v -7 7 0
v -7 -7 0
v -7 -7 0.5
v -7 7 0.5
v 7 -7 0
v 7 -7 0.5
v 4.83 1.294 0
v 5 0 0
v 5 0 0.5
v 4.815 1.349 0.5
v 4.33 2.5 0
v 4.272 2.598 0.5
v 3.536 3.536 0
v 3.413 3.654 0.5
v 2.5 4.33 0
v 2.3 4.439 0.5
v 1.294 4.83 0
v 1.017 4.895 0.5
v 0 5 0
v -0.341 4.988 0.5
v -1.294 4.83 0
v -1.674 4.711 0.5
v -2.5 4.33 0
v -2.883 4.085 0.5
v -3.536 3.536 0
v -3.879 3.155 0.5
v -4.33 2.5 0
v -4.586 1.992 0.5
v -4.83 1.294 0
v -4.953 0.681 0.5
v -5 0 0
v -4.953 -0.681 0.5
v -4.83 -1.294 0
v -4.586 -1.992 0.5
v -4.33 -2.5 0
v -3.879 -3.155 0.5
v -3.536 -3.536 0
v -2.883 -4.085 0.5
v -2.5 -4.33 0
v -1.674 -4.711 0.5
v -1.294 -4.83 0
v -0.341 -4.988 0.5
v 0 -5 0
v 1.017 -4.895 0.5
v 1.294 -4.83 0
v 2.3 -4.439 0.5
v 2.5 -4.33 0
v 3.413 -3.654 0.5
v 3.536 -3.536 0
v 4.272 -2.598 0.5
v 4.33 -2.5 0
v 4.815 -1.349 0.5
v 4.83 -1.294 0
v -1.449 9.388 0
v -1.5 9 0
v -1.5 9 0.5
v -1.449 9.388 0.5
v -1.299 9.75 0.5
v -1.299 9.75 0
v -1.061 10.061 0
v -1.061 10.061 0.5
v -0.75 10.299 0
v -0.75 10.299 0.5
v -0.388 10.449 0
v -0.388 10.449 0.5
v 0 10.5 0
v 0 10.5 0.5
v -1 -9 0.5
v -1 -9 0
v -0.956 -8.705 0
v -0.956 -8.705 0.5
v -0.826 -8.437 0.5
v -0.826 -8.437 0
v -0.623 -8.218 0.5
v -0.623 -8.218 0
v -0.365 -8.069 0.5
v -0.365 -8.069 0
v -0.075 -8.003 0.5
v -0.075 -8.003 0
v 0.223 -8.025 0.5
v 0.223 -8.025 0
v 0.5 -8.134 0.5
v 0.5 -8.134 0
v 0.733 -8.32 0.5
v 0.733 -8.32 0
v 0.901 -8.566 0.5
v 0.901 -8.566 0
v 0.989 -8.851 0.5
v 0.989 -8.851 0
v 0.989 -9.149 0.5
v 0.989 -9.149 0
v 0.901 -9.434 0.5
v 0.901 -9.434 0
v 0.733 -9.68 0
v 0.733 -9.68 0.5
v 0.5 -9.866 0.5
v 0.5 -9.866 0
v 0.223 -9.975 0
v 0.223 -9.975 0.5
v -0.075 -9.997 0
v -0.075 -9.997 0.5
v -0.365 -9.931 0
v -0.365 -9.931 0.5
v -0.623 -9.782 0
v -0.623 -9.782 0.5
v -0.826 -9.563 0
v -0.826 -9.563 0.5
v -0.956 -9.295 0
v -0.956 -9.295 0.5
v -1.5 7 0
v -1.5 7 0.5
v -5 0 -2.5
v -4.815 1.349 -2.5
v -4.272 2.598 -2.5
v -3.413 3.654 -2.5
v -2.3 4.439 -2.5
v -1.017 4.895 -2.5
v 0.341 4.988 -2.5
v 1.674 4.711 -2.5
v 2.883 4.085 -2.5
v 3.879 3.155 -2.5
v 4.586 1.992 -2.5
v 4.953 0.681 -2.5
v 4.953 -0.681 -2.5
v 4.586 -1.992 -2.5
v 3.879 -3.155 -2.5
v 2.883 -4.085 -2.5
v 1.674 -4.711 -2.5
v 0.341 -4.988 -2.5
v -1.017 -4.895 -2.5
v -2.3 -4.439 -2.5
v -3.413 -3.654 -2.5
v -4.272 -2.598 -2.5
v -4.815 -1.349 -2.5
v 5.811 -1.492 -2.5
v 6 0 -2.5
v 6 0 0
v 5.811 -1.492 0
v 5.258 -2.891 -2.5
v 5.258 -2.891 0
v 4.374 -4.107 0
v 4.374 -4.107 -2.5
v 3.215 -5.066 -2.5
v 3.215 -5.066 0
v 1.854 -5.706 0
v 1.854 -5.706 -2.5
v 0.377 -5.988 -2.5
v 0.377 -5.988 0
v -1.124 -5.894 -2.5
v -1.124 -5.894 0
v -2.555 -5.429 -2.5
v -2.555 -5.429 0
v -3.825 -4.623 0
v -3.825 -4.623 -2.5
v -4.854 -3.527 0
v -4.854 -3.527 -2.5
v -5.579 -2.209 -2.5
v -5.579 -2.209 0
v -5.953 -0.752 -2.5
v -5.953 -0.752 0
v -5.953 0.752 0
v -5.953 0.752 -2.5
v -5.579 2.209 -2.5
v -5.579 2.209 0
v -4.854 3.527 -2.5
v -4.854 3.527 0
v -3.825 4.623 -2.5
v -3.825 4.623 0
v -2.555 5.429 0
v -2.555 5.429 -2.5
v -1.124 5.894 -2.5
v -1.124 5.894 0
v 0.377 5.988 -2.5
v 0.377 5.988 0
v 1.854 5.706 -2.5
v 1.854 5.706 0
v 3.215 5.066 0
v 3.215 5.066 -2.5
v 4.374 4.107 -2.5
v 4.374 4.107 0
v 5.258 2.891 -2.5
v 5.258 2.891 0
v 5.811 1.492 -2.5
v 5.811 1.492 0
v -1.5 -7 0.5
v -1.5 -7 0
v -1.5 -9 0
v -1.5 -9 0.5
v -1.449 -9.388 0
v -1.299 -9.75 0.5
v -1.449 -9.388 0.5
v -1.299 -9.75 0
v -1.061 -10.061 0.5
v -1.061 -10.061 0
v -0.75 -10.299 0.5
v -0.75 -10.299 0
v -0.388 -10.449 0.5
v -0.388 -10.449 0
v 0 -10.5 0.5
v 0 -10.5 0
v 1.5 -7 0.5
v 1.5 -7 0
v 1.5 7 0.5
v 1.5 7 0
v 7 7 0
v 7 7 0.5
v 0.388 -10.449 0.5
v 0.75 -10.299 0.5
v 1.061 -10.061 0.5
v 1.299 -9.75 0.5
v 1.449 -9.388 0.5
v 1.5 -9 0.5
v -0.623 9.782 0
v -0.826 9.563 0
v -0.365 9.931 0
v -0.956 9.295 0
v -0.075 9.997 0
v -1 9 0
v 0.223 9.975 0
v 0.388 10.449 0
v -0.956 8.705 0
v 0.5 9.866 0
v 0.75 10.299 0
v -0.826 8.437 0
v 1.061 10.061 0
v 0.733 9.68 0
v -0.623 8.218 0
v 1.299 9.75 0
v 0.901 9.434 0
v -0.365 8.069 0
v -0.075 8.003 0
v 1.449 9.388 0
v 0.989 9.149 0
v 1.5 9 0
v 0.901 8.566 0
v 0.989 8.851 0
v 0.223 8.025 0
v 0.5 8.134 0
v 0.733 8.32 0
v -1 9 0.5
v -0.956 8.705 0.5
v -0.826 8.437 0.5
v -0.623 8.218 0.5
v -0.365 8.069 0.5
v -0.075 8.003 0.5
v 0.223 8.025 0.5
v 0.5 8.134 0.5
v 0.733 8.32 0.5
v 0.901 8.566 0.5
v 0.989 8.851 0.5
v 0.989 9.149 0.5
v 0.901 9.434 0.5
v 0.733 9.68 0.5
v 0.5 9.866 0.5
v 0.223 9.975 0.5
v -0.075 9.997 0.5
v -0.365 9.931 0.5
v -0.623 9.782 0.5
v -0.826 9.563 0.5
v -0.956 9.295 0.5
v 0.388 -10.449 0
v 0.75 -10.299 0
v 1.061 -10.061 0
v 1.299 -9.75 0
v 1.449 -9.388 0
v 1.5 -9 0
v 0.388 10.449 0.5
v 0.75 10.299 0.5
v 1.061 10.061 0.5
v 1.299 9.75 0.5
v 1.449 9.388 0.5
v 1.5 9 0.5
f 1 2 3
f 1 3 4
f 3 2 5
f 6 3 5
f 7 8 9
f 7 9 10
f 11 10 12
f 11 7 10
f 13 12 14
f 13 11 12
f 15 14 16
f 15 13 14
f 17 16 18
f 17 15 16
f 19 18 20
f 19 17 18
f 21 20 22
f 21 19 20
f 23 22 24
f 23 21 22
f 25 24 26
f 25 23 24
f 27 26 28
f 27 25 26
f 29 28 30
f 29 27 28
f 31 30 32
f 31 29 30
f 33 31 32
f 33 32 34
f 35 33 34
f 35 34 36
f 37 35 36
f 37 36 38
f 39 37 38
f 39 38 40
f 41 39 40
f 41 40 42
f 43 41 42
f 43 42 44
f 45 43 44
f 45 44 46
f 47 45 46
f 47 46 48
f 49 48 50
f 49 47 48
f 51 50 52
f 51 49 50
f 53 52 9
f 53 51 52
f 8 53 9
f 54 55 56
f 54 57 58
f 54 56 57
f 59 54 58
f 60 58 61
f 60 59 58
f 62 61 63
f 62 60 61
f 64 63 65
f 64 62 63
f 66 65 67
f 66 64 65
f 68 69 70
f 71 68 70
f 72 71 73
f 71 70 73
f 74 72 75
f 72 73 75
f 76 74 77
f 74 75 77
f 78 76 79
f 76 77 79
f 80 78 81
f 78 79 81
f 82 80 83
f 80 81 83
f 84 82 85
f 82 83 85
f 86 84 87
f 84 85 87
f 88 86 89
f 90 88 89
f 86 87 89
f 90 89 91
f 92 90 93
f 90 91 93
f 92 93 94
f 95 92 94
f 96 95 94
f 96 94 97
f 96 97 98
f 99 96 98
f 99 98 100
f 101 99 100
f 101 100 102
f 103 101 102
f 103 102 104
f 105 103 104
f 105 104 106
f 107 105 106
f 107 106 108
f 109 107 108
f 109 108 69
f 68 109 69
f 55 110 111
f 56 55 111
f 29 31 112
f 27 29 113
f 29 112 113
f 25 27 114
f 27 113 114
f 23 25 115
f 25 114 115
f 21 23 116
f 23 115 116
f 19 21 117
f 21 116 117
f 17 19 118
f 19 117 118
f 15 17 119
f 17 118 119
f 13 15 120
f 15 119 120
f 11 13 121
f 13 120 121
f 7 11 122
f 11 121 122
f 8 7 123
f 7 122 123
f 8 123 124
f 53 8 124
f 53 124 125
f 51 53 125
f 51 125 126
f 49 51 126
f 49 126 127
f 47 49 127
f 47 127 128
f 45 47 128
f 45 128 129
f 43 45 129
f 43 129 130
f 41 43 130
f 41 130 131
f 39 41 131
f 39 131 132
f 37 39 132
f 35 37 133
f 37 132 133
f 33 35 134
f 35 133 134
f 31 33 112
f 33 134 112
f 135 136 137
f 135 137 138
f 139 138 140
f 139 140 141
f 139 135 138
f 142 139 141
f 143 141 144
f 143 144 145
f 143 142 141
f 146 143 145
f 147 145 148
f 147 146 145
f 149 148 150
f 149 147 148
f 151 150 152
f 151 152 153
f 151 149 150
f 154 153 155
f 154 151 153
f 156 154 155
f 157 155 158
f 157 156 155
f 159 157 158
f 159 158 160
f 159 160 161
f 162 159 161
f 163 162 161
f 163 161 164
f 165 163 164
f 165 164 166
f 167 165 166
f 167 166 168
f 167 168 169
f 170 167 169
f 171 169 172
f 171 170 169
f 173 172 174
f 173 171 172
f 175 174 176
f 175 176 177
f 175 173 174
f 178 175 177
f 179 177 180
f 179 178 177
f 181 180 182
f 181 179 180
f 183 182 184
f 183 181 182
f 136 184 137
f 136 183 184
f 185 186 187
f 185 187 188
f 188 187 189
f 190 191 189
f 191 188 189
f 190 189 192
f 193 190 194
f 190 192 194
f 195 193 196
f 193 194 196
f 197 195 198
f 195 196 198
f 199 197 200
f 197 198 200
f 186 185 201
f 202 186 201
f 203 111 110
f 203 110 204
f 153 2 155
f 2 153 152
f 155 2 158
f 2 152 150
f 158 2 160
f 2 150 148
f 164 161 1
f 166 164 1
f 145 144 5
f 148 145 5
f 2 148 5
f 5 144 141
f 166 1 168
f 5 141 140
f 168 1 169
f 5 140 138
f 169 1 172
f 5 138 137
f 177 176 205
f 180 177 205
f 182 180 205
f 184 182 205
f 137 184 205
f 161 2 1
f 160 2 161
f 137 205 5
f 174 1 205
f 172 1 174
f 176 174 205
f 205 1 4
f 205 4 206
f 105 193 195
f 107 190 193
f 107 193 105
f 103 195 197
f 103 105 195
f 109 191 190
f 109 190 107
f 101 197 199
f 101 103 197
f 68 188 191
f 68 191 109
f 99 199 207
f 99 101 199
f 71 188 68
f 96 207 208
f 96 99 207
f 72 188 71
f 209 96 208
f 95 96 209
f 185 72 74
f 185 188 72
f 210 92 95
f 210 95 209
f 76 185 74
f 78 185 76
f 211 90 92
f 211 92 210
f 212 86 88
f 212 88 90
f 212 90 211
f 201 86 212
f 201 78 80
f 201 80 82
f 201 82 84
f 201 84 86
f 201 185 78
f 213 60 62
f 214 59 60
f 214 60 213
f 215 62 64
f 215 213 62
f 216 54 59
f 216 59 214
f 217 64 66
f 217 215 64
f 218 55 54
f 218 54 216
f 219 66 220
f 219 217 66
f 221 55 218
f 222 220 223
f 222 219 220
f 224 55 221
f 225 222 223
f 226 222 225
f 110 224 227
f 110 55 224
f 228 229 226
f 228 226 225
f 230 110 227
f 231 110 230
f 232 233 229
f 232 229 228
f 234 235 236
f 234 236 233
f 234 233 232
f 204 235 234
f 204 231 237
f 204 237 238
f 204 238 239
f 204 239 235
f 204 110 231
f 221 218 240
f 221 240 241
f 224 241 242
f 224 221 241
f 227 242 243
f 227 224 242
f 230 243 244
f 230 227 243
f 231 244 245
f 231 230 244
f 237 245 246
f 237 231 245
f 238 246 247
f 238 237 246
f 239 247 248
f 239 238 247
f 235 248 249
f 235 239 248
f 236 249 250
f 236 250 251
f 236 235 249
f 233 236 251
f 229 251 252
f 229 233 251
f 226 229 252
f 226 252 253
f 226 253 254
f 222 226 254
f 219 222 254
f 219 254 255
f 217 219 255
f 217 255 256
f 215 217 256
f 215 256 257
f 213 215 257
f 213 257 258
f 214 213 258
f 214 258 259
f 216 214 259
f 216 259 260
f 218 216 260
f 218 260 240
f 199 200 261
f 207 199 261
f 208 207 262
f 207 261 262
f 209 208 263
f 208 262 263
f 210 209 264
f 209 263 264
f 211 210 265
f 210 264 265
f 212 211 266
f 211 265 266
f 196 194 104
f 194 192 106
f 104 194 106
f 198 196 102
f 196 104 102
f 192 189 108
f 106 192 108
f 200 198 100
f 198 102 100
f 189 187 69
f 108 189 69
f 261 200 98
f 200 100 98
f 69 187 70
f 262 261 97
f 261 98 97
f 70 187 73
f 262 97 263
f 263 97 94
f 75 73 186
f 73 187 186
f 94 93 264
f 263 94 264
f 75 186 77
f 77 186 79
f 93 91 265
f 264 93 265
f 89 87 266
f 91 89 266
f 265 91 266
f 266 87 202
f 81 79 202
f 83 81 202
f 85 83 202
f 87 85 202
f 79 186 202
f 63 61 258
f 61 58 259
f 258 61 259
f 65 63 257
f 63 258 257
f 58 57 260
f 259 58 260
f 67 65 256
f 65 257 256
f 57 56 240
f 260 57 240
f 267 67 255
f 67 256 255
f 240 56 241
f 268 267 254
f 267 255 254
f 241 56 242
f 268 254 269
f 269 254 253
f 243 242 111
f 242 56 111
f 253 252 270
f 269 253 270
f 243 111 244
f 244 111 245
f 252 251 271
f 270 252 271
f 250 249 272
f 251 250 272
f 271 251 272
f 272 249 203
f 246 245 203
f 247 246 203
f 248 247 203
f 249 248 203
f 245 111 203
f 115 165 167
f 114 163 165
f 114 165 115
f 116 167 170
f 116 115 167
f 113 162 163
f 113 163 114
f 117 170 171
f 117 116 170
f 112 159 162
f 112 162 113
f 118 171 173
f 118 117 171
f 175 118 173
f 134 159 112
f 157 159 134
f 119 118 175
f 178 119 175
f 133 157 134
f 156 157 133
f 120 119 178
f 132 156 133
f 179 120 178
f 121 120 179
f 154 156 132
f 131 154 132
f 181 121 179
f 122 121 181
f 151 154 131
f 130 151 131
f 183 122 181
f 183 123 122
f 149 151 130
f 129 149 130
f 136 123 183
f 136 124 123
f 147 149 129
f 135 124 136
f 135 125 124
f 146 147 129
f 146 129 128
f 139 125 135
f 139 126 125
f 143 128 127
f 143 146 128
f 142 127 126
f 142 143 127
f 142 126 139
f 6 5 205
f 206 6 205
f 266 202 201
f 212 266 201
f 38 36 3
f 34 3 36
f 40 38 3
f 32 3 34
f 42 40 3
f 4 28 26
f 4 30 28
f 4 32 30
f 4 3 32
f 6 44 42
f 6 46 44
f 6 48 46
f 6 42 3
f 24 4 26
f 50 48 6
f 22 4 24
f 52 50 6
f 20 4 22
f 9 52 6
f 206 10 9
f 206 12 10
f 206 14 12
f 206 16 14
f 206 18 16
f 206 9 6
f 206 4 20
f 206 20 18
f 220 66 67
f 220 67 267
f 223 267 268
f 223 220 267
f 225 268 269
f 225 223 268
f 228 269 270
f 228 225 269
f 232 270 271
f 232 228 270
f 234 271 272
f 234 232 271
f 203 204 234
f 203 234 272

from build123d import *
from build123d.topology import SkipClean

# Parameters (mm, degrees)
SKETCH_2_W          = 14
SKETCH_2_H          = 14
SKETCH_2_R          = 5
EXTRUDE_1_DEPTH     = 0.5
SKETCH_3_W          = 3
SKETCH_3_H          = 0.5
EXTRUDE_2_DEPTH     = 3.5
CUT_EXTRUDE_1_DEPTH = 4
SKETCH_5_R          = 1
CUT_EXTRUDE_2_DEPTH = 4
EXTRUDE_START       = 2.5
SKETCH_6_R          = 6
SKETCH_6_R_2        = 5
EXTRUDE_3_DEPTH     = 2.5


with BuildPart() as part:
    # 草图2 → 凸台-拉伸1 (new body)
    with BuildSketch(Plane.XY):
        Rectangle(SKETCH_2_W, SKETCH_2_H)
        Circle(SKETCH_2_R, mode=Mode.SUBTRACT)
    extrude(amount=EXTRUDE_1_DEPTH)

    # 草图6 → 凸台-拉伸3 (add)
    with SkipClean():  # the faces are left unmerged after this step: merging them gives an invalid solid
        with BuildSketch(Plane(origin=(0, 0, 0), x_dir=(-1, 0, 0), z_dir=(0, 0, -1)).offset(EXTRUDE_START)):
            with Locations(Location((0, 0, 0), (0, 0, 180))):
                Circle(SKETCH_6_R)
            Circle(SKETCH_6_R_2, mode=Mode.SUBTRACT)
        extrude(amount=-EXTRUDE_3_DEPTH)


with BuildPart() as body_2:
    # 草图3 → 凸台-拉伸2 (new body)
    with BuildSketch(Plane.XZ.offset(7)):
        with Locations((0, 0.25)):
            Rectangle(SKETCH_3_W, SKETCH_3_H)
    extrude(amount=EXTRUDE_2_DEPTH)

    # 草图4 → 切除-拉伸1 (cut)
    with BuildSketch(Plane(origin=(0, 0, 0), x_dir=(-1, 0, 0), z_dir=(0, 0, -1))):
        with BuildLine():
            Line((1.5, -10.5), (1.5, -9))
            ThreePointArc((1.5, -9), (1.060660172, -10.060660172), (0, -10.5))
            Line((0, -10.5), (1.5, -10.5))
        make_face()
        with BuildLine():
            ThreePointArc((0, -10.5), (-1.060660172, -10.060660172), (-1.5, -9))
            Line((-1.5, -9), (-1.5, -10.5))
            Line((-1.5, -10.5), (0, -10.5))
        make_face()
    extrude(amount=-CUT_EXTRUDE_1_DEPTH, mode=Mode.SUBTRACT)

    # 草图5 → 切除-拉伸2 (cut)
    with BuildSketch(Plane(origin=(0, 0, 0), x_dir=(-1, 0, 0), z_dir=(0, 0, -1))):
        with Locations((0, -9)):
            Circle(SKETCH_5_R)
    extrude(amount=-CUT_EXTRUDE_2_DEPTH, mode=Mode.SUBTRACT)


with BuildPart() as body_3:
    # 镜向7: mirrored copy
    add(body_2.part.mirror(Plane.ZX))


solid = Compound([part.part, body_2.part, body_3.part])
